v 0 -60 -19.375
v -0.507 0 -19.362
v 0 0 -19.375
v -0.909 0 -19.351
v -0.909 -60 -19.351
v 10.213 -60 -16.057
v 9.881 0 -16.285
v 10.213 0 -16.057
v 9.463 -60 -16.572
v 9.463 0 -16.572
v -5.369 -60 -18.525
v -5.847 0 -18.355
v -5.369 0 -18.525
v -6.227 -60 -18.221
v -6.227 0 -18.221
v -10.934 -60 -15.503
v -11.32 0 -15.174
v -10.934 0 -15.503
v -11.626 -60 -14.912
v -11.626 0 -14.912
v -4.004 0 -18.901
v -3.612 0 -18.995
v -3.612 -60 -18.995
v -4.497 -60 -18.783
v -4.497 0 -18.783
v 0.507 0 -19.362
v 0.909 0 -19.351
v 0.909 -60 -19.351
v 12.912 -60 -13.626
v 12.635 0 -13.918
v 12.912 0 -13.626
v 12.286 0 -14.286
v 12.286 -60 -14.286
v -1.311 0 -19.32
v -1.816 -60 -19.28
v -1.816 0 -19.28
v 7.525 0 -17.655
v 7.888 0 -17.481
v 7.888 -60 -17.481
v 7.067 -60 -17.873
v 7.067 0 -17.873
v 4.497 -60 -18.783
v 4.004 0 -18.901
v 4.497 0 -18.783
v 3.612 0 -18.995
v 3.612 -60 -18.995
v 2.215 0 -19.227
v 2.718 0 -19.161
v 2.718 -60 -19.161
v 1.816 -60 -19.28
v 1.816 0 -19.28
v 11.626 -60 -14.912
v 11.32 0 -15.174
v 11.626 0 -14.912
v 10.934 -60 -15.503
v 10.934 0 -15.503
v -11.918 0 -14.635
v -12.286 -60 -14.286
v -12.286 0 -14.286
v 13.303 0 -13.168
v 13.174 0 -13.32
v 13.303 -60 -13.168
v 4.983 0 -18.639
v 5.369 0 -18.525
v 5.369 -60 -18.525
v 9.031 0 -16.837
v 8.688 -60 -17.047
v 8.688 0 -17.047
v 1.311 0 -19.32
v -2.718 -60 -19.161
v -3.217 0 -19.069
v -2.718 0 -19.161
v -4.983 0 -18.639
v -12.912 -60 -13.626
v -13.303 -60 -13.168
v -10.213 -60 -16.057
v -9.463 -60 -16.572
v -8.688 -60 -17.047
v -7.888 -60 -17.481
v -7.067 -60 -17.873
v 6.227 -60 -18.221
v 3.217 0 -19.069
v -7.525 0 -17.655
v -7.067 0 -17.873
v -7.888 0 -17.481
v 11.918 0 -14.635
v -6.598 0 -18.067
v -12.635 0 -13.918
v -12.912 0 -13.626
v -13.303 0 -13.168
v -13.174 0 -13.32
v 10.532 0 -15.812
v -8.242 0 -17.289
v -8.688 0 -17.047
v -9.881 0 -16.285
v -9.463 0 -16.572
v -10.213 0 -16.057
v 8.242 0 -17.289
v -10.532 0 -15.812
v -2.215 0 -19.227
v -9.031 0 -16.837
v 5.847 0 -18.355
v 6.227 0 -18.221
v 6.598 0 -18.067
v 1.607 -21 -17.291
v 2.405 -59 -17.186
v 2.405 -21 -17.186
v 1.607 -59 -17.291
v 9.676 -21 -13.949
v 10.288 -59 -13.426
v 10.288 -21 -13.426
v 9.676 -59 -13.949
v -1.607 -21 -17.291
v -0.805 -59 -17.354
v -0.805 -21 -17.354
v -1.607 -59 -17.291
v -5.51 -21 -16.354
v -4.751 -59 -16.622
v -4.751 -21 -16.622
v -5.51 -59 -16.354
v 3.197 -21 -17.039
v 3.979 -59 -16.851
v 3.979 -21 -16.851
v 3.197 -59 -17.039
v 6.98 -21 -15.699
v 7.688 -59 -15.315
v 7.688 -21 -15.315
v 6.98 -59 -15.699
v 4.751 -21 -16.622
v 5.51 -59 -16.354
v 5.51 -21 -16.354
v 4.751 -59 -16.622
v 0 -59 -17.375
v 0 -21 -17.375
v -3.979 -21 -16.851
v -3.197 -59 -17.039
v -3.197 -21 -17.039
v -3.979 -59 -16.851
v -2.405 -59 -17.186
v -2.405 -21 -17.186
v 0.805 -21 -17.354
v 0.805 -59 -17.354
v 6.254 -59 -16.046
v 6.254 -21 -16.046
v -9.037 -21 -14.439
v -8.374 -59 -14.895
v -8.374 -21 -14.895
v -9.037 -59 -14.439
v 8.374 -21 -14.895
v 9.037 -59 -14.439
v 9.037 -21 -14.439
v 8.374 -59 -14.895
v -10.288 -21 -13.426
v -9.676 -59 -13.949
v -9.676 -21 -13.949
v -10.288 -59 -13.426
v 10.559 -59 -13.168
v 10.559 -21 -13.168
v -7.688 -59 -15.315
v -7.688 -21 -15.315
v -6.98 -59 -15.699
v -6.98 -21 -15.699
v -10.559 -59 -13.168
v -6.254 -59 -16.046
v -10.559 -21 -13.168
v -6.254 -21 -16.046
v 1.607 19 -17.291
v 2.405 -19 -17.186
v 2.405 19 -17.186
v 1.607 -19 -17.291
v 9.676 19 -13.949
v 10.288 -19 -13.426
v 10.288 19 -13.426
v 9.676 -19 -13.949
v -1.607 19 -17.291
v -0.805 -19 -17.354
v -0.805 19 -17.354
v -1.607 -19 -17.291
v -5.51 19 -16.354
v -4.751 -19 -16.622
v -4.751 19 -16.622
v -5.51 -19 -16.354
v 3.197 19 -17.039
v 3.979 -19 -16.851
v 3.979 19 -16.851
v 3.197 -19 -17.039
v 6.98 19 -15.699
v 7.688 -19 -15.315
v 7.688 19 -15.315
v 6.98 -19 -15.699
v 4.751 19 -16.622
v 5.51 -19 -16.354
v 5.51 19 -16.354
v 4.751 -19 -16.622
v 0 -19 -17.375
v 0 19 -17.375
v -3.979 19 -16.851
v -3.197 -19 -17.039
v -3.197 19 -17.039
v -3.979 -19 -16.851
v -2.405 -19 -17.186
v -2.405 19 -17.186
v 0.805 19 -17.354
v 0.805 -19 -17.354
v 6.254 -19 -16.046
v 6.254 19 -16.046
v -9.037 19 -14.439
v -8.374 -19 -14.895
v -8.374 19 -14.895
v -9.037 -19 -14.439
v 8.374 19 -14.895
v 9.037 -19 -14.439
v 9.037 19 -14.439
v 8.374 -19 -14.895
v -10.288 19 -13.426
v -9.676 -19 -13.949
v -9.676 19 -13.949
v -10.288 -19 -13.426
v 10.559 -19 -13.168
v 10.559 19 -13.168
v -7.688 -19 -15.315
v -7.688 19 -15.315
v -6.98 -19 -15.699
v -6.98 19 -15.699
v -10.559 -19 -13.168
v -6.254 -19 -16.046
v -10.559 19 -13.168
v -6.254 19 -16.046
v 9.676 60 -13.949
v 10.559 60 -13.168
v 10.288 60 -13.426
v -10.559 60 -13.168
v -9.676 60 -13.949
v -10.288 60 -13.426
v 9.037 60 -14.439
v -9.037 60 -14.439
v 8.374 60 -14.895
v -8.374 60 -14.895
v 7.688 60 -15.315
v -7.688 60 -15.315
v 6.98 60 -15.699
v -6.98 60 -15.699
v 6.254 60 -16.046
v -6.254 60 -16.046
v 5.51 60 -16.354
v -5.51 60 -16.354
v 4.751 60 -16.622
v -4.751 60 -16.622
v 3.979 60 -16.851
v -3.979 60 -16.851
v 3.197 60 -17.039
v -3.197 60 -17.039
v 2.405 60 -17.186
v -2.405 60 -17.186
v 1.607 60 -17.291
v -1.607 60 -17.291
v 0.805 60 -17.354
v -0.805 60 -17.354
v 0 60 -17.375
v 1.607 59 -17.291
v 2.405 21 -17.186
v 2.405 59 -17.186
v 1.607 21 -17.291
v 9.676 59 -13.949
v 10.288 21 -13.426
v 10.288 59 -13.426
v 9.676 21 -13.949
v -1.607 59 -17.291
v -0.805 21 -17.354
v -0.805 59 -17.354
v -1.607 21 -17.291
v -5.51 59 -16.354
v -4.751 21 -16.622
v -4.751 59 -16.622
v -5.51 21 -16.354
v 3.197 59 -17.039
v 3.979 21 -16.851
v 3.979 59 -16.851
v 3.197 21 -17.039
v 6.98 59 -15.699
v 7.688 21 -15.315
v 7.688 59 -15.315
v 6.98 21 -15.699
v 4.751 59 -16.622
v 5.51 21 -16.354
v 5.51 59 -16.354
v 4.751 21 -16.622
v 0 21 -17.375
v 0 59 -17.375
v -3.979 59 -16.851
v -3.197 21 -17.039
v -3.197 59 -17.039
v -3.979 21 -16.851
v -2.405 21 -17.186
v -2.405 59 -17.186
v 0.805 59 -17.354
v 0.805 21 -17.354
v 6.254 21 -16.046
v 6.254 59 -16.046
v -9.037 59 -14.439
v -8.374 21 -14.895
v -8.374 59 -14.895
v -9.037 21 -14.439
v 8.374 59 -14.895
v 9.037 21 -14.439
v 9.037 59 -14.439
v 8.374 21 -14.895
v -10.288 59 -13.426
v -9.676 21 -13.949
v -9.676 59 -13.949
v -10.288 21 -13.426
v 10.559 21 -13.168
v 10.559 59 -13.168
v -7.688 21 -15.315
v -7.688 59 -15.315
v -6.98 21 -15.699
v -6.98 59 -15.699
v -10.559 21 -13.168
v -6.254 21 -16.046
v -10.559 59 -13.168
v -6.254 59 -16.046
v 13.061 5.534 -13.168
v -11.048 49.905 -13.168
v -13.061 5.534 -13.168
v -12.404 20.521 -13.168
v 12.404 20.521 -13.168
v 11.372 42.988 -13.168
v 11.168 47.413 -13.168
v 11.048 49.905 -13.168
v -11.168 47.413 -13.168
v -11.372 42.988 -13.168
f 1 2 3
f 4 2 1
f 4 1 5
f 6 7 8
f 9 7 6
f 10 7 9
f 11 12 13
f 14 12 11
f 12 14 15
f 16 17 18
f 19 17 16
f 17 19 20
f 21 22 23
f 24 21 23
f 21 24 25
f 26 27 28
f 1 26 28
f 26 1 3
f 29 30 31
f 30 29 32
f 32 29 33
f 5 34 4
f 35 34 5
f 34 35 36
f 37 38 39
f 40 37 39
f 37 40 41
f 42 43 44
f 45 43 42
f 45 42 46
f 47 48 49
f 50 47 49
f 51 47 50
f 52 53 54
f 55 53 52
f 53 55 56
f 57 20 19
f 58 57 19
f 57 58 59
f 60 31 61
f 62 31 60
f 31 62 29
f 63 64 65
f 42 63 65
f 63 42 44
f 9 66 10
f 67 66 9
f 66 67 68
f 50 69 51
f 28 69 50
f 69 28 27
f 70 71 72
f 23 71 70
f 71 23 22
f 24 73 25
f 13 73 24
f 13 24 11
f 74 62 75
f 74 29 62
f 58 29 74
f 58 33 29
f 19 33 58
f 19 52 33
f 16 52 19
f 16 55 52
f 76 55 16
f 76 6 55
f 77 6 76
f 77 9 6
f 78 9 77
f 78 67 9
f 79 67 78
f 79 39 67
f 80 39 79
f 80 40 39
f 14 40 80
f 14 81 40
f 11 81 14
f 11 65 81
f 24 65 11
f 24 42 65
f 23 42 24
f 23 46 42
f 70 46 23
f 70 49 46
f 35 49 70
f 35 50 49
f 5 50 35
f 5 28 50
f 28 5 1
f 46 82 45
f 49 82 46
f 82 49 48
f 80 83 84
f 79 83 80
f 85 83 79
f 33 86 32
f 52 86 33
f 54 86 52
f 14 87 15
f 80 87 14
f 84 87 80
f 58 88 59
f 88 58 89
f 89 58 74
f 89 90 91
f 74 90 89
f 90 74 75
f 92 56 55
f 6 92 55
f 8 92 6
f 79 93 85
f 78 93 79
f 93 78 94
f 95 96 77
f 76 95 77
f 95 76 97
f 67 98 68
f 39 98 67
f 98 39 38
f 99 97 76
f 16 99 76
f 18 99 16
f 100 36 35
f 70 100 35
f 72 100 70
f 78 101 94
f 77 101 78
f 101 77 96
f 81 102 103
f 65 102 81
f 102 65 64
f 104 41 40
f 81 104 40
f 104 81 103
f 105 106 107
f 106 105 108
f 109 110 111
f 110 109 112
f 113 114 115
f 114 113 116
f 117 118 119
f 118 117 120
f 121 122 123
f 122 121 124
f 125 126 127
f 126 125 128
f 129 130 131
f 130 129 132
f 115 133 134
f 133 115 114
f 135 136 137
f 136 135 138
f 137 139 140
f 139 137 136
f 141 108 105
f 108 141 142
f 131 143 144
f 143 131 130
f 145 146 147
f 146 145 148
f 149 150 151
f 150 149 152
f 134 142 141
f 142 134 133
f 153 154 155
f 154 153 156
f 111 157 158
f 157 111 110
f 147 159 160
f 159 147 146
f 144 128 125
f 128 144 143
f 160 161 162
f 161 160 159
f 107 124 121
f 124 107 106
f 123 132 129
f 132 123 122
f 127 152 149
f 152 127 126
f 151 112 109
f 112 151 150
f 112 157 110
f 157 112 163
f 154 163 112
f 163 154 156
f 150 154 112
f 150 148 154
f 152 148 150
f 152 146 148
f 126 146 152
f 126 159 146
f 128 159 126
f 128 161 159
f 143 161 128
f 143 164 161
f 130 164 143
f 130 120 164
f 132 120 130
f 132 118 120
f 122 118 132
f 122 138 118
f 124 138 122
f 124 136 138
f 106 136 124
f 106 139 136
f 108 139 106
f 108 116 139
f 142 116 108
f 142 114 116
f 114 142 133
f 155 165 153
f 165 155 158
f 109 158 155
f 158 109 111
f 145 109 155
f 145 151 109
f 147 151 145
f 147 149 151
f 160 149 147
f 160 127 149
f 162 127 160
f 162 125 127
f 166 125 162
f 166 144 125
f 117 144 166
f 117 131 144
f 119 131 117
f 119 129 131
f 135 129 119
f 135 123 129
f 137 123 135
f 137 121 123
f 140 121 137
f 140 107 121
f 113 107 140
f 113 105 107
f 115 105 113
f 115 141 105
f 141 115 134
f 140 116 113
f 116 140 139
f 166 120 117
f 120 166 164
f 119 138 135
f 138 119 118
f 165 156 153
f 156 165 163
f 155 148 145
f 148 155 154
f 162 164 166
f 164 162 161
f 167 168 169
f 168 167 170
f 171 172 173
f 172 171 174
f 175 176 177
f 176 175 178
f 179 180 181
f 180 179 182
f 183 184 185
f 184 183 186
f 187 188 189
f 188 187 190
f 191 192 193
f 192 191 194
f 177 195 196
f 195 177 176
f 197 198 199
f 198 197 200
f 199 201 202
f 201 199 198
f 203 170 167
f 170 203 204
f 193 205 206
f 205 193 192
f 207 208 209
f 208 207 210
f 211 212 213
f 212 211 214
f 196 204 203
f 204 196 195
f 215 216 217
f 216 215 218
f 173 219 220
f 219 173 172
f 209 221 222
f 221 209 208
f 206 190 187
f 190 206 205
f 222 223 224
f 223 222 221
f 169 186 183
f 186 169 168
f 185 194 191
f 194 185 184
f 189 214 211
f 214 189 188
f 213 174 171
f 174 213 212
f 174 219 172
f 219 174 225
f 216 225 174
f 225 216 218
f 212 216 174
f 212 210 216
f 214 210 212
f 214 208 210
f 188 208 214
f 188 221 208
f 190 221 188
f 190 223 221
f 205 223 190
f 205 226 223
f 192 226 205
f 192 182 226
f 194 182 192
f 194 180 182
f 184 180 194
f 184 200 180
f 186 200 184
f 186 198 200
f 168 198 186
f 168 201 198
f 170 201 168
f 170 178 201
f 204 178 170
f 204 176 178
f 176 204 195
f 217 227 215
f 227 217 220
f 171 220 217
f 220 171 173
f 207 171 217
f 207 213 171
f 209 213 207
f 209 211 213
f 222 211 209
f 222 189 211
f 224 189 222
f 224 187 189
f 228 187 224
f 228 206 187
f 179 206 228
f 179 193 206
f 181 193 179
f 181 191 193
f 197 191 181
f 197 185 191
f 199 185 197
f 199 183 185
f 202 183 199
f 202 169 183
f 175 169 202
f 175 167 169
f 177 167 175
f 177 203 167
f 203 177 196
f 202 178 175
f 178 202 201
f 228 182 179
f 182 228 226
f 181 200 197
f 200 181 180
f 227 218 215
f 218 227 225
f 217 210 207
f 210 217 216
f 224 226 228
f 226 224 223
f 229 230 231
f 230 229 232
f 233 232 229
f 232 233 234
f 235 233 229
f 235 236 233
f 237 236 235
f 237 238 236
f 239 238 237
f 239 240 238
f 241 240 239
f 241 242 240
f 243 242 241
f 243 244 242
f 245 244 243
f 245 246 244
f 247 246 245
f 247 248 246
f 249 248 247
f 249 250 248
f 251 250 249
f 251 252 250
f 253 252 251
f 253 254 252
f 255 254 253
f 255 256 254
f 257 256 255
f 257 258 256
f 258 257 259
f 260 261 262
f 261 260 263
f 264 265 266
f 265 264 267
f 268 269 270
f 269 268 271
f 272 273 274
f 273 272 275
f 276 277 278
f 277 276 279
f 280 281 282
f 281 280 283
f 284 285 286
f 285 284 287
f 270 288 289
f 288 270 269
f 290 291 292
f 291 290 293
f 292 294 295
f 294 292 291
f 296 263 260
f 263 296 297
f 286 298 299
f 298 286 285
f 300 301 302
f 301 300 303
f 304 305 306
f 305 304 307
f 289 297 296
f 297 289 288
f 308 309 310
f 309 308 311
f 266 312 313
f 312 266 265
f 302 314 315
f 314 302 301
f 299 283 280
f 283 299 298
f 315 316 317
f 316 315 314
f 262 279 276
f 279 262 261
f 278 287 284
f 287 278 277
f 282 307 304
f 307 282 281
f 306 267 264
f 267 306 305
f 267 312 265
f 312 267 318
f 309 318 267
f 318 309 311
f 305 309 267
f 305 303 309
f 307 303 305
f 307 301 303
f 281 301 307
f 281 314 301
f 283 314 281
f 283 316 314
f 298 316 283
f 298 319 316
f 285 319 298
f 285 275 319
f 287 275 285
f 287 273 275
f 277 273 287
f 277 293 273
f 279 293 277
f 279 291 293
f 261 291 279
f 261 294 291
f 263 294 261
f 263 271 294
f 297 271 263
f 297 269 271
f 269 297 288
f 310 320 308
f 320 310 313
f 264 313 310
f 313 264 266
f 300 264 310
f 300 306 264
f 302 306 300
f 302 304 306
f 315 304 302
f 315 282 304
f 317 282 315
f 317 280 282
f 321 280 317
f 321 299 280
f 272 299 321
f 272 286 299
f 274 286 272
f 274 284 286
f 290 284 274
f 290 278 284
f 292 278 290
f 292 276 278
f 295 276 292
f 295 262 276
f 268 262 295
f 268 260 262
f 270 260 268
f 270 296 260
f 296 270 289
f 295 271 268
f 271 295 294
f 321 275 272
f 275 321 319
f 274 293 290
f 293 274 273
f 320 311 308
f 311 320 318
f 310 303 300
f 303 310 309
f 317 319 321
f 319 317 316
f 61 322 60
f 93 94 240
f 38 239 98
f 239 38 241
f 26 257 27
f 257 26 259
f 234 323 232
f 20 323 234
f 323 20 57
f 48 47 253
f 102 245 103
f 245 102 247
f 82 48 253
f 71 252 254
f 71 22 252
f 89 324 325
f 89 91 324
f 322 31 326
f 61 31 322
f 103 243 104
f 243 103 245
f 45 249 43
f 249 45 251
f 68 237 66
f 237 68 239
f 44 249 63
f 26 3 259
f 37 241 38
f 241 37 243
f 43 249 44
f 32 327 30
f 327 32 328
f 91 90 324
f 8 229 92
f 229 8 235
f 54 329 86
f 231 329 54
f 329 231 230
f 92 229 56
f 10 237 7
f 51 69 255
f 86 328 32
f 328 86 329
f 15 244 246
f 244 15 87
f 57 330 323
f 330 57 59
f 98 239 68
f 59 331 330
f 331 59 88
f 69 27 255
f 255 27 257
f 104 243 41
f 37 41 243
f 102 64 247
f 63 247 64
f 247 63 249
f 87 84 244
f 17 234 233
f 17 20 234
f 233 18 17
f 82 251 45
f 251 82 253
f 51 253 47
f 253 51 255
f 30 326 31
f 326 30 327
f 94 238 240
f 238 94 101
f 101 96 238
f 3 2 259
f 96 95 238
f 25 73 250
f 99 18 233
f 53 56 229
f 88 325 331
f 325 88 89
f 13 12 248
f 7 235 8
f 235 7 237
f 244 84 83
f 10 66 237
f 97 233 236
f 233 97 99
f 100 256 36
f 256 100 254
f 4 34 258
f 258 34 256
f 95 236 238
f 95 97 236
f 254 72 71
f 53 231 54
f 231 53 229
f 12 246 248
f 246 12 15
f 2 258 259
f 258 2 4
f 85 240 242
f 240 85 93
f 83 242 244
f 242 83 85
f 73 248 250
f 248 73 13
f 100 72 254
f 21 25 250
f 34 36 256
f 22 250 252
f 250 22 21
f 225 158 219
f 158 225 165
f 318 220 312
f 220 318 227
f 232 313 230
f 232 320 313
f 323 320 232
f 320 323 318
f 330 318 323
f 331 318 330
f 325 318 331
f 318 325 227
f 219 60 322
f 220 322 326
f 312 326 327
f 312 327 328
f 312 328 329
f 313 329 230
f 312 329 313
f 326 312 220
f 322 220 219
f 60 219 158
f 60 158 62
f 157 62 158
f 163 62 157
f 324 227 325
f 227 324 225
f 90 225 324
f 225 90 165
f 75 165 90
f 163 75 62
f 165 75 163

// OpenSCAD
// This file is Copyright Robert L. Read 2025.
// Although Public Invention does everything open source, this file is an
// exception.

// This is a work in progress. There are a number of tasks:
// *) Create any empty chamber (for collecting particulates)
// *) Create the Corkscrew voids
// *) Add ejectiong slits to the Coorkscrews
// *) desideratum: make the internal shape circular from the POV of the tunnel.
// *) desideratom: design an "ice cream cone shape" with the point pointing out.
//    we desire to do A-B testing on this.
// *) Have 10 cells, each of which has a gravity feed into a particulate bin.
// *) The number of particulate bins should be 1 or up to 3.
// *) 6 turns is desired.



// =================== BEGIN INCLUDED CODE ================ 
// by varnerrants is licensed under the Creative Commons - Attribution license.

// Super-Duper Parametric Hose Barb

// This is for the manometer hose
// Hose Outer Diameter (used to calculate shlouder length)
hose_od = 5;
// Hose Inner Diameter
hose_id = 2.5;

// How far the barbs swell the diameter.
swell = 1.5;

// Wall thickness of the barb.
wall_thickness = 1.31;

// Number of barbs.
barbs = 3;
// How far between each barb section?
barb_length = 2;

// Do you want to render the outer shell?
shell = true;

// Do you want to render the bore?
bore = true;

// Flattens the barbs on one end. Usefull if youre printing barbs at angles, as the flattened side can be rotated downward facing the bed.
ezprint = false;

// barb(hose_od = hose_od, hose_id = hose_id, swell = swell, wall_thickness = wall_thickness, barbs = barbs, barb_length = barb_length, shell = shell, bore = bore, ezprint = ezprint);


module barb(hose_od = 21.5, hose_id = 15, swell = 1, wall_thickness = 1.31, barbs = 3, barb_length = 2, shell = true, bore = true, ezprint = true) {
    echo("hose_id", hose_id);
    id = hose_id - (2 * wall_thickness);
    translate([0, 0, -((barb_length * (barbs + 1)) + 4.5 + (hose_od - hose_id))])
    difference() {
        union() {
            if (shell == true) {
                cylinder(d = hose_id, h = barb_length);
                for (z = [1 : 1 : barbs]) {
                    translate([0, 0, z * barb_length]) cylinder(d1 = hose_id, d2 = hose_id + swell, h = barb_length);
                }
                translate([0, 0, barb_length * (barbs + 1)]) cylinder(d = hose_id, h = 4.5 + (hose_od - hose_id));
            }
        }
        if (bore == true) {
//            translate([0, 0, -1]) cylinder(d = id, h = (barb_length * (barbs + 1)) + 4.5 + (hose_od - hose_id) + 1);
           translate([0, 0, -1]) cylinder(d = id, h = 1+ (barb_length * (barbs + 1)) + 4.5 + (hose_od - hose_id) + 1);
        }
        if (ezprint == true) {
            difference() {
                cylinder(d = hose_id + (swell * 3), h = (barb_length * (barbs + 1)));
                translate([swell, 0, 0]) cylinder(d = hose_id + (swell * 2), h = (barb_length * (barbs + 1)));
            }
        }
    }
}



// =================== END INCLUDED CODE ================ 

// Questions for John:
// Should the ports have barbs?
// Should the ouutput ports have barb?
// What dimensions do we want?

// TODO: make barbs more flush
// TODO: 

TC_VERSION_NUM = 0.5; // printing helix without bins


// use <BarbGenerator-v3.scad>;


// Params (mm), degrees 

num_bins = 3;
// number_of_complete_revolutions = 2*num_bins;
number_of_revolutions_in_bin = 2;
number_of_complete_revolutions = number_of_revolutions_in_bin*num_bins;
// filter_height_mm = num_bins*40/3;
filter_height_mm = num_bins*120/3;
// WARNING! Trying to reduce this to one bin seemed to make the slit go away

filter_twist_degrees = 360*number_of_complete_revolutions;
// screw_OD_mm = 3.5;
screw_OD_mm = 5.5;
screw_ID_mm = 3.0;
cell_wall_mm = 1;
barb_input_diameter = 2;
barb_output_diameter = 5;
barb_wall_thickness = 1;

// we will use this improve the chance of a good taper fit.
taper_outer_radius_decrease = 2;

// The slit_axial_open_length_mm is the "length",
// in an axial sense of the 
slit_axial_open_length_mm = 2;
// Dubious about this....
slit_axial_length_mm = cell_wall_mm + slit_axial_open_length_mm;
// slit_axial_length_mm = slit_axial_length_mm - cell_wall_mm;

// The "slit_knife" is "radial" in the since that it cuts
// a pie-slice shaped slit into the wall of the helix.
// The wider the angle, the greater the slit. 180 would
// be half the slit. I suggest this be limited to 45 degrees.
slit_knife_angle = 45;
hex_cell_diam_mm = 10;
FN_RES = 120;
$fn = 120;
bin_height_z_mm = 20;
num_screws = 1;

screw_center_separation_mm = 10;

// This is 1.25" in mm to fit inside a normal 
// American vacuum cleaner hose.
// Ideally we would be male (outer_d = 1.25") on one side
// with a female part (inner_d = 1.25" on the other side,
// with a slight taper!
// Note: In practice this needs to be somewhat larger 
// to not "slip into" the pipe (on my vacuum cleaner)
// bin_out_radius = 31.75/2;
bin_out_radius = (31.75 + 3)/2;
// bin_out_radius = 20;
bin_breadth_x_mm = max((num_screws -1) * screw_center_separation_mm + screw_center_separation_mm*2,
    bin_out_radius*2);
    
bin_cutaway_angle = 50;
    
if (bin_breadth_x_mm > bin_out_radius*2) {
    echo("DANGER!! MISFIT!! bin_breadth_x_mm too large!");
}

pitch_mm = filter_height_mm / number_of_complete_revolutions;

scale_ratio = 1.4; // This is used to acheive a more circular air path

bin_wall_thickness_mm = 1;


// CONTROL_VARIABLES
USE_SCREW_ONLY          = 0;
USE_VOIDLESS_SCREW      = 0;
USE_FULL_BINS           = 0;
USE_KNIFE_THRU_SCREWS   = 0;
USE_KNIFE_LOW           = 0;
USE_KNIFE_SIDE          = 0;
USE_KNIFE_TOP_HALF      = 0;
USE_SCREW_KNIFE         = 0;
USE_BARBS               = 0;

USE_FITTING             = 0;

USE_BINCAP              = 1;

USE_FITTING_KNIFE       = 0;

TEST_BARB                = 0;


module Barb(input_diameter,output_diameter) {
    rotate([180,0,0])
    barb(hose_od = input_diameter, hose_id = output_diameter, swell = 2, wall_thickness = barb_wall_thickness, barbs = barbs, barb_length = barb_length, shell = shell, bore = bore, ezprint = ezprint);
}


if (TEST_BARB) {
    jheight = 0;
    translate([15,0,0])
    Barb(barb_input_diameter,barb_output_diameter);
}


// Standalone BinCap generation
//if (USE_BINCAP) {
//    translate([0,0,-bin_height_z_mm+8])
//    BinCap(filter_height_mm,num_bins,bin_height_z_mm,bin_breadth_x_mm, screw_center_separation_mm);
//}

// coordinate system: Gravity points in the -Z direction. +Z is up.abs
// The left-right dimentions is considered X. Air flow is in the positive Y
// direction. The is a right-handed coordinate system.

module Corkscrew(h,twist) {
    rotate([90,0,0])
    linear_extrude(height = h, center = true, convexity = 10, twist = twist, $fn = FN_RES)
    translate([screw_OD_mm, 0, 0])
    scale([1,scale_ratio])
    circle(r = screw_OD_mm);
}


module CorkscrewSlitKnife(twist,depth,num_bins) {
    de = depth/num_bins;
    yrot = 360*(1 / pitch_mm)*de;
    
    // Note: The computation of the slit angle 
    // is a complicated. We create a triangle that 
    // we linearly extruide (in the "polygon" state below.)
    D = 20;
    W = D * tan(slit_knife_angle);
 //   translate([10,0,0])
//    polygon(points = [[0,0],[D,-W],[D,W]]);   

    rotate([90,0,0])
    for(i = [0:num_bins -1]) {
        translate([0,0,-de])
        rotate([0,0,-yrot*(i+1)])
        translate([0,0,(i+1)*de])
        difference() {
            linear_extrude(height = depth, center = true, convexity = 10, twist = twist, $fn = FN_RES)
            translate([screw_OD_mm,0,0])
            rotate([0,0,0])
            polygon(points = [[0,0],[D,-W],[D,W]]);   
            color("blue",0.3)
            translate([0,0,slit_axial_length_mm])
            cube([22,22,depth],center=true);
        }
    }
    
}

module CorkscrewWithVoid(h,twist) {
    rotate([90,0,0])
    linear_extrude(height = h, center = true, convexity = 10, twist = twist, $fn = FN_RES)
    translate([screw_OD_mm, 0, 0])
    difference() {
        scale([1,scale_ratio])
        circle(r = screw_OD_mm);
        scale([1,scale_ratio])
        circle(r = screw_ID_mm);
    }
}

module CorkscrewWithoutVoid(h,twist) {
    echo("CorkscrewWithoutTwist");
    echo(scale_ratio);
    rotate([90,0,0])
    linear_extrude(height = h, center = true, convexity = 10, twist = twist, $fn = FN_RES)
    translate([screw_OD_mm, 0, 0])
    scale([1,scale_ratio])
    circle(r = screw_OD_mm);
}

module CorkscrewWithoutVoidExcess(h,twist) {
    CorkscrewWithoutVoid(h*2,twist*2);
}


module CorkscrewWithSlit(depth,numbins) {
      difference() {
        CorkscrewWithVoid(depth,filter_twist_degrees);
        CorkscrewSlitKnife(filter_twist_degrees,depth,numbins);
    }
 //   translate([10,0,0])
 //   #CorkscrewSlitKnife(filter_twist_degrees,depth,numbins);
}

// Bins module now generates 1/8" NPT female threads instead of barbs.
module Bins(depth,numbins,height,width,height_above_port_line) {
    b = bin_wall_thickness_mm*2;
    bin_radius = width/2;
    // Now I try to do this math to create multiple bins
    // These will be cubes; orifices will have to be cut
    // in them later.
    de = depth/numbins; // w = width of one bin
    intersection() {
        // This puts a slight taper on the system for fitting...
        // Male end is the outlet end (direction of flow out)
        rotate([90,0,0])
        cylinder(de*numbins,bin_radius-taper_outer_radius_decrease,bin_radius+taper_outer_radius_decrease,center = true);
        for(i = [0:numbins -1]) {
            j = -(numbins-1)/2 + i;
            translate([0,j*de,0])
            translate([0,0,height_above_port_line - height/2])
            union() {
                difference() {
                // We can change this cylinder I think...
                    rotate([90,0,0])
                    // we want to put a very slight taper on this cylinder..
                    cylinder(de,bin_radius,bin_radius,center = true);
     //               cube([width,de,height],center = true);
                    // I want the bottom to be opened and then "capped"
                    //translate([0,0,-(b+1)])
                    rotate([90,0,0])
                    cylinder(de-b,bin_radius-b,bin_radius-b,center=true);
     //               cube([width-b,de-b,height-bin_wall_thickness_mm+2],center=true);
                     if (USE_BARBS) {
                        translate([width/2,0,0])
                        rotate([0,90,0])
                        cylinder(b*2,barb_input_diameter,     barb_input_diameter,center=true);
                    }
                } 
                if (USE_BARBS) {
                    translate([width/2 - bin_wall_thickness_mm,0,0])
                    rotate([0,90,0])
                    Barb(barb_input_diameter,barb_output_diameter);
                }
            } 
        }
    }
    

}
module BinsCutaway(depth,numbins,height,width,height_above_port_line) {
    bin_radius = width/2;
    cut_point = (bin_radius)*cos(bin_cutaway_angle);
    s = 1000;
    difference() {
        Bins(depth,numbins,height,width,height_above_port_line);
        translate([0,0,-cut_point + -s/2])
        cube([s,s,s],center = true);         
    }
}
module BinsCylindricalCap(depth,numbins,height,width,height_above_port_line) {
    bin_radius = width/2;
    cut_point = (bin_radius)*cos(bin_cutaway_angle);
    s = 1000;
    difference() {
        Bins(depth,numbins,height,width,height_above_port_line);
        translate([0,0,-cut_point + s/2])
        cube([s,s,s],center = true);         
    }
}


module BinCap(depth,numbins,height,width,height_above_port_line) {
    b = bin_wall_thickness_mm*2;
    difference() {
        cube([width+b,depth+b,3],center=true);
        translate([0,0,bin_wall_thickness_mm])
        cube([width,depth,3],center=true);
    }
}

module Screws(num_screws,num_bins,depth) {
    d = (num_screws-1)*screw_center_separation_mm;
    union() {
        for (i = [0:num_screws-1]) {
            x =  -d/2+ i * screw_center_separation_mm;
            translate([x,0,0])
            CorkscrewWithSlit(depth,num_bins);
        }
    }
}
module ScrewsKnife(num_screws,num_bins,depth) {

    d = (num_screws-1)*screw_center_separation_mm;
    // Warning!  This is a bug; I should do the math
    // better. If we are doing 1 revolution because of 
    // printing thin walls, then we have to rotate here...
    // which shows that my math is incomplete...
    theta = (number_of_revolutions_in_bin == 1) ? 180 : 0;
    echo(" ================= theta");
    echo(theta);
    echo(number_of_revolutions_in_bin);
    rotate([0,0,theta])
    union() {
        // now we must cut the ports
        for (i = [0:num_screws-1]) {
             x =  -d/2+ i * screw_center_separation_mm;
             translate([x,0,0])
             CorkscrewWithoutVoidExcess(depth,filter_twist_degrees);
        }  
     }   
}

module BarbPort() {
    translate([0, 0, 0])
    rotate([0,0,90])
    rotate([0,90,0])
    Barb(barb_input_diameter,barb_output_diameter);
}


module BinsWithScrew(nums_screws,num_bins) {
    d = (num_screws-1)*screw_center_separation_mm;
    difference() {
        BinsCutaway(filter_height_mm,num_bins,bin_height_z_mm,bin_breadth_x_mm, screw_center_separation_mm);
        ScrewsKnife(num_screws,num_bins,filter_height_mm);
    }
    
    for (i = [0:num_screws-1]) {
        x =  -d/2 + i * screw_center_separation_mm;
        translate([x,0,0])
        CorkscrewWithSlit(filter_height_mm,num_bins);
    }
      
    if (USE_BARBS) {
        // Outlet
        translate([0,filter_height_mm/2,0])
        translate([screw_OD_mm,0,0])
        BarbPort();
        
        // Inlet
        translate([0,-filter_height_mm/2,0])
        translate([screw_OD_mm,0,0])
        rotate([0,0,180])
        BarbPort();
    }
}

// This is a simple tapered fitting with
// a female side and a male side, appropriately tapered.
// It also has an "internal stop", to make the male part
// fit into it will not be inserted so far as to cover up
// the pressure barb.
module PressureAndFilterFitting() {
    stage_length = 60;
    // this is the male OD and the female ID
    basic_radius = bin_out_radius;
    attachment_wall_width = 3;
    stop_wall_width = 1;
    inner_most_radius = basic_radius - attachment_wall_width;
    slop = 2;
    taper_radius = 2;
    
    difference() {
        // Now add barb for measuring pressure...
        union() {
            translate([basic_radius-5,0,-5])
            rotate([0,-90,0])       
            barb(hose_od, hose_id, swell, wall_thickness, barbs, barb_length, shell, bore, ezprint);
            // This intersection adds a taper...
            intersection() {
                cylinder(h = stage_length,r1 = basic_radius - taper_radius, r2 = basic_radius+taper_radius,center = true);
            // This is the main cylinder
                difference() {
                    cylinder(h = (stage_length),r = basic_radius+1,center = true);
            // This it the inside knife, with an internal stop
                    union() {
                        // female part
                        translate([0,0,(stage_length+slop)/4])
                        cylinder(h = (stage_length+slop)/2,
                        r1 = inner_most_radius, 
                        r2 = inner_most_radius+taper_radius,
                        center = true);
                        // male part
                        translate([0,0,-(stage_length+slop)/4])
                        cylinder(h = (stage_length+slop)/2,r = inner_most_radius-stop_wall_width,center = true);
                    }
                }
            }
        }
        // now drill out the pressure sensor barb
        translate([basic_radius+4,0,-5])
        rotate([0,-90,0])
        cylinder(h=barb_length*barbs+20,r=(hose_id-wall_thickness)/2,center=true);   
    }

}

if (USE_BINCAP) {
    translate([0,0,-2])
    BinsCylindricalCap(filter_height_mm,num_bins,bin_height_z_mm,bin_breadth_x_mm, screw_center_separation_mm);
}
    
    
    
if (USE_FULL_BINS) {

    difference() {
        BinsWithScrew(num_screws,num_bins);
        if (USE_KNIFE_THRU_SCREWS) {
            translate([0,0,-50])
            cube([200,200,100],center = true);
        }
        if (USE_KNIFE_LOW) {
            translate([0,0,-50+-10])
            cube([100,100,100],center = true);
        }
        if (USE_KNIFE_SIDE) {
            translate([50+5,0,0])
            cube([100,100,100],center = true);
            translate([-(50+5),0,0])
            cube([100,100,100],center = true);
        }   
        if (USE_KNIFE_TOP_HALF) {
            translate([0,0,50])
            cube([100,100,100],center = true);
        }
    }
       
}

if (USE_BINCAP) {
    translate([0,0,-2])
        BinsCylindricalCap(filter_height_mm,num_bins,bin_height_z_mm    ,bin_breadth_x_mm, screw_center_separation_mm);
}

if (USE_SCREW_ONLY) {
    Screws(num_screws,num_bins,filter_height_mm);
}
if (USE_SCREW_KNIFE) {
    ScrewsKnife(num_screws,num_bins,filter_height_mm);
}
if (USE_VOIDLESS_SCREW) {
    CorkscrewWithoutVoid(filter_height_mm,filter_twist_degrees);
}

if (USE_FITTING) {   
    difference() {
        translate([0,50,0])
        rotate([90,0,0])
        PressureAndFilterFitting();
        if (USE_FITTING_KNIFE ) {
            translate([0,0,-100])
            cube([200,200,200],center = true);
        }
    }
}
